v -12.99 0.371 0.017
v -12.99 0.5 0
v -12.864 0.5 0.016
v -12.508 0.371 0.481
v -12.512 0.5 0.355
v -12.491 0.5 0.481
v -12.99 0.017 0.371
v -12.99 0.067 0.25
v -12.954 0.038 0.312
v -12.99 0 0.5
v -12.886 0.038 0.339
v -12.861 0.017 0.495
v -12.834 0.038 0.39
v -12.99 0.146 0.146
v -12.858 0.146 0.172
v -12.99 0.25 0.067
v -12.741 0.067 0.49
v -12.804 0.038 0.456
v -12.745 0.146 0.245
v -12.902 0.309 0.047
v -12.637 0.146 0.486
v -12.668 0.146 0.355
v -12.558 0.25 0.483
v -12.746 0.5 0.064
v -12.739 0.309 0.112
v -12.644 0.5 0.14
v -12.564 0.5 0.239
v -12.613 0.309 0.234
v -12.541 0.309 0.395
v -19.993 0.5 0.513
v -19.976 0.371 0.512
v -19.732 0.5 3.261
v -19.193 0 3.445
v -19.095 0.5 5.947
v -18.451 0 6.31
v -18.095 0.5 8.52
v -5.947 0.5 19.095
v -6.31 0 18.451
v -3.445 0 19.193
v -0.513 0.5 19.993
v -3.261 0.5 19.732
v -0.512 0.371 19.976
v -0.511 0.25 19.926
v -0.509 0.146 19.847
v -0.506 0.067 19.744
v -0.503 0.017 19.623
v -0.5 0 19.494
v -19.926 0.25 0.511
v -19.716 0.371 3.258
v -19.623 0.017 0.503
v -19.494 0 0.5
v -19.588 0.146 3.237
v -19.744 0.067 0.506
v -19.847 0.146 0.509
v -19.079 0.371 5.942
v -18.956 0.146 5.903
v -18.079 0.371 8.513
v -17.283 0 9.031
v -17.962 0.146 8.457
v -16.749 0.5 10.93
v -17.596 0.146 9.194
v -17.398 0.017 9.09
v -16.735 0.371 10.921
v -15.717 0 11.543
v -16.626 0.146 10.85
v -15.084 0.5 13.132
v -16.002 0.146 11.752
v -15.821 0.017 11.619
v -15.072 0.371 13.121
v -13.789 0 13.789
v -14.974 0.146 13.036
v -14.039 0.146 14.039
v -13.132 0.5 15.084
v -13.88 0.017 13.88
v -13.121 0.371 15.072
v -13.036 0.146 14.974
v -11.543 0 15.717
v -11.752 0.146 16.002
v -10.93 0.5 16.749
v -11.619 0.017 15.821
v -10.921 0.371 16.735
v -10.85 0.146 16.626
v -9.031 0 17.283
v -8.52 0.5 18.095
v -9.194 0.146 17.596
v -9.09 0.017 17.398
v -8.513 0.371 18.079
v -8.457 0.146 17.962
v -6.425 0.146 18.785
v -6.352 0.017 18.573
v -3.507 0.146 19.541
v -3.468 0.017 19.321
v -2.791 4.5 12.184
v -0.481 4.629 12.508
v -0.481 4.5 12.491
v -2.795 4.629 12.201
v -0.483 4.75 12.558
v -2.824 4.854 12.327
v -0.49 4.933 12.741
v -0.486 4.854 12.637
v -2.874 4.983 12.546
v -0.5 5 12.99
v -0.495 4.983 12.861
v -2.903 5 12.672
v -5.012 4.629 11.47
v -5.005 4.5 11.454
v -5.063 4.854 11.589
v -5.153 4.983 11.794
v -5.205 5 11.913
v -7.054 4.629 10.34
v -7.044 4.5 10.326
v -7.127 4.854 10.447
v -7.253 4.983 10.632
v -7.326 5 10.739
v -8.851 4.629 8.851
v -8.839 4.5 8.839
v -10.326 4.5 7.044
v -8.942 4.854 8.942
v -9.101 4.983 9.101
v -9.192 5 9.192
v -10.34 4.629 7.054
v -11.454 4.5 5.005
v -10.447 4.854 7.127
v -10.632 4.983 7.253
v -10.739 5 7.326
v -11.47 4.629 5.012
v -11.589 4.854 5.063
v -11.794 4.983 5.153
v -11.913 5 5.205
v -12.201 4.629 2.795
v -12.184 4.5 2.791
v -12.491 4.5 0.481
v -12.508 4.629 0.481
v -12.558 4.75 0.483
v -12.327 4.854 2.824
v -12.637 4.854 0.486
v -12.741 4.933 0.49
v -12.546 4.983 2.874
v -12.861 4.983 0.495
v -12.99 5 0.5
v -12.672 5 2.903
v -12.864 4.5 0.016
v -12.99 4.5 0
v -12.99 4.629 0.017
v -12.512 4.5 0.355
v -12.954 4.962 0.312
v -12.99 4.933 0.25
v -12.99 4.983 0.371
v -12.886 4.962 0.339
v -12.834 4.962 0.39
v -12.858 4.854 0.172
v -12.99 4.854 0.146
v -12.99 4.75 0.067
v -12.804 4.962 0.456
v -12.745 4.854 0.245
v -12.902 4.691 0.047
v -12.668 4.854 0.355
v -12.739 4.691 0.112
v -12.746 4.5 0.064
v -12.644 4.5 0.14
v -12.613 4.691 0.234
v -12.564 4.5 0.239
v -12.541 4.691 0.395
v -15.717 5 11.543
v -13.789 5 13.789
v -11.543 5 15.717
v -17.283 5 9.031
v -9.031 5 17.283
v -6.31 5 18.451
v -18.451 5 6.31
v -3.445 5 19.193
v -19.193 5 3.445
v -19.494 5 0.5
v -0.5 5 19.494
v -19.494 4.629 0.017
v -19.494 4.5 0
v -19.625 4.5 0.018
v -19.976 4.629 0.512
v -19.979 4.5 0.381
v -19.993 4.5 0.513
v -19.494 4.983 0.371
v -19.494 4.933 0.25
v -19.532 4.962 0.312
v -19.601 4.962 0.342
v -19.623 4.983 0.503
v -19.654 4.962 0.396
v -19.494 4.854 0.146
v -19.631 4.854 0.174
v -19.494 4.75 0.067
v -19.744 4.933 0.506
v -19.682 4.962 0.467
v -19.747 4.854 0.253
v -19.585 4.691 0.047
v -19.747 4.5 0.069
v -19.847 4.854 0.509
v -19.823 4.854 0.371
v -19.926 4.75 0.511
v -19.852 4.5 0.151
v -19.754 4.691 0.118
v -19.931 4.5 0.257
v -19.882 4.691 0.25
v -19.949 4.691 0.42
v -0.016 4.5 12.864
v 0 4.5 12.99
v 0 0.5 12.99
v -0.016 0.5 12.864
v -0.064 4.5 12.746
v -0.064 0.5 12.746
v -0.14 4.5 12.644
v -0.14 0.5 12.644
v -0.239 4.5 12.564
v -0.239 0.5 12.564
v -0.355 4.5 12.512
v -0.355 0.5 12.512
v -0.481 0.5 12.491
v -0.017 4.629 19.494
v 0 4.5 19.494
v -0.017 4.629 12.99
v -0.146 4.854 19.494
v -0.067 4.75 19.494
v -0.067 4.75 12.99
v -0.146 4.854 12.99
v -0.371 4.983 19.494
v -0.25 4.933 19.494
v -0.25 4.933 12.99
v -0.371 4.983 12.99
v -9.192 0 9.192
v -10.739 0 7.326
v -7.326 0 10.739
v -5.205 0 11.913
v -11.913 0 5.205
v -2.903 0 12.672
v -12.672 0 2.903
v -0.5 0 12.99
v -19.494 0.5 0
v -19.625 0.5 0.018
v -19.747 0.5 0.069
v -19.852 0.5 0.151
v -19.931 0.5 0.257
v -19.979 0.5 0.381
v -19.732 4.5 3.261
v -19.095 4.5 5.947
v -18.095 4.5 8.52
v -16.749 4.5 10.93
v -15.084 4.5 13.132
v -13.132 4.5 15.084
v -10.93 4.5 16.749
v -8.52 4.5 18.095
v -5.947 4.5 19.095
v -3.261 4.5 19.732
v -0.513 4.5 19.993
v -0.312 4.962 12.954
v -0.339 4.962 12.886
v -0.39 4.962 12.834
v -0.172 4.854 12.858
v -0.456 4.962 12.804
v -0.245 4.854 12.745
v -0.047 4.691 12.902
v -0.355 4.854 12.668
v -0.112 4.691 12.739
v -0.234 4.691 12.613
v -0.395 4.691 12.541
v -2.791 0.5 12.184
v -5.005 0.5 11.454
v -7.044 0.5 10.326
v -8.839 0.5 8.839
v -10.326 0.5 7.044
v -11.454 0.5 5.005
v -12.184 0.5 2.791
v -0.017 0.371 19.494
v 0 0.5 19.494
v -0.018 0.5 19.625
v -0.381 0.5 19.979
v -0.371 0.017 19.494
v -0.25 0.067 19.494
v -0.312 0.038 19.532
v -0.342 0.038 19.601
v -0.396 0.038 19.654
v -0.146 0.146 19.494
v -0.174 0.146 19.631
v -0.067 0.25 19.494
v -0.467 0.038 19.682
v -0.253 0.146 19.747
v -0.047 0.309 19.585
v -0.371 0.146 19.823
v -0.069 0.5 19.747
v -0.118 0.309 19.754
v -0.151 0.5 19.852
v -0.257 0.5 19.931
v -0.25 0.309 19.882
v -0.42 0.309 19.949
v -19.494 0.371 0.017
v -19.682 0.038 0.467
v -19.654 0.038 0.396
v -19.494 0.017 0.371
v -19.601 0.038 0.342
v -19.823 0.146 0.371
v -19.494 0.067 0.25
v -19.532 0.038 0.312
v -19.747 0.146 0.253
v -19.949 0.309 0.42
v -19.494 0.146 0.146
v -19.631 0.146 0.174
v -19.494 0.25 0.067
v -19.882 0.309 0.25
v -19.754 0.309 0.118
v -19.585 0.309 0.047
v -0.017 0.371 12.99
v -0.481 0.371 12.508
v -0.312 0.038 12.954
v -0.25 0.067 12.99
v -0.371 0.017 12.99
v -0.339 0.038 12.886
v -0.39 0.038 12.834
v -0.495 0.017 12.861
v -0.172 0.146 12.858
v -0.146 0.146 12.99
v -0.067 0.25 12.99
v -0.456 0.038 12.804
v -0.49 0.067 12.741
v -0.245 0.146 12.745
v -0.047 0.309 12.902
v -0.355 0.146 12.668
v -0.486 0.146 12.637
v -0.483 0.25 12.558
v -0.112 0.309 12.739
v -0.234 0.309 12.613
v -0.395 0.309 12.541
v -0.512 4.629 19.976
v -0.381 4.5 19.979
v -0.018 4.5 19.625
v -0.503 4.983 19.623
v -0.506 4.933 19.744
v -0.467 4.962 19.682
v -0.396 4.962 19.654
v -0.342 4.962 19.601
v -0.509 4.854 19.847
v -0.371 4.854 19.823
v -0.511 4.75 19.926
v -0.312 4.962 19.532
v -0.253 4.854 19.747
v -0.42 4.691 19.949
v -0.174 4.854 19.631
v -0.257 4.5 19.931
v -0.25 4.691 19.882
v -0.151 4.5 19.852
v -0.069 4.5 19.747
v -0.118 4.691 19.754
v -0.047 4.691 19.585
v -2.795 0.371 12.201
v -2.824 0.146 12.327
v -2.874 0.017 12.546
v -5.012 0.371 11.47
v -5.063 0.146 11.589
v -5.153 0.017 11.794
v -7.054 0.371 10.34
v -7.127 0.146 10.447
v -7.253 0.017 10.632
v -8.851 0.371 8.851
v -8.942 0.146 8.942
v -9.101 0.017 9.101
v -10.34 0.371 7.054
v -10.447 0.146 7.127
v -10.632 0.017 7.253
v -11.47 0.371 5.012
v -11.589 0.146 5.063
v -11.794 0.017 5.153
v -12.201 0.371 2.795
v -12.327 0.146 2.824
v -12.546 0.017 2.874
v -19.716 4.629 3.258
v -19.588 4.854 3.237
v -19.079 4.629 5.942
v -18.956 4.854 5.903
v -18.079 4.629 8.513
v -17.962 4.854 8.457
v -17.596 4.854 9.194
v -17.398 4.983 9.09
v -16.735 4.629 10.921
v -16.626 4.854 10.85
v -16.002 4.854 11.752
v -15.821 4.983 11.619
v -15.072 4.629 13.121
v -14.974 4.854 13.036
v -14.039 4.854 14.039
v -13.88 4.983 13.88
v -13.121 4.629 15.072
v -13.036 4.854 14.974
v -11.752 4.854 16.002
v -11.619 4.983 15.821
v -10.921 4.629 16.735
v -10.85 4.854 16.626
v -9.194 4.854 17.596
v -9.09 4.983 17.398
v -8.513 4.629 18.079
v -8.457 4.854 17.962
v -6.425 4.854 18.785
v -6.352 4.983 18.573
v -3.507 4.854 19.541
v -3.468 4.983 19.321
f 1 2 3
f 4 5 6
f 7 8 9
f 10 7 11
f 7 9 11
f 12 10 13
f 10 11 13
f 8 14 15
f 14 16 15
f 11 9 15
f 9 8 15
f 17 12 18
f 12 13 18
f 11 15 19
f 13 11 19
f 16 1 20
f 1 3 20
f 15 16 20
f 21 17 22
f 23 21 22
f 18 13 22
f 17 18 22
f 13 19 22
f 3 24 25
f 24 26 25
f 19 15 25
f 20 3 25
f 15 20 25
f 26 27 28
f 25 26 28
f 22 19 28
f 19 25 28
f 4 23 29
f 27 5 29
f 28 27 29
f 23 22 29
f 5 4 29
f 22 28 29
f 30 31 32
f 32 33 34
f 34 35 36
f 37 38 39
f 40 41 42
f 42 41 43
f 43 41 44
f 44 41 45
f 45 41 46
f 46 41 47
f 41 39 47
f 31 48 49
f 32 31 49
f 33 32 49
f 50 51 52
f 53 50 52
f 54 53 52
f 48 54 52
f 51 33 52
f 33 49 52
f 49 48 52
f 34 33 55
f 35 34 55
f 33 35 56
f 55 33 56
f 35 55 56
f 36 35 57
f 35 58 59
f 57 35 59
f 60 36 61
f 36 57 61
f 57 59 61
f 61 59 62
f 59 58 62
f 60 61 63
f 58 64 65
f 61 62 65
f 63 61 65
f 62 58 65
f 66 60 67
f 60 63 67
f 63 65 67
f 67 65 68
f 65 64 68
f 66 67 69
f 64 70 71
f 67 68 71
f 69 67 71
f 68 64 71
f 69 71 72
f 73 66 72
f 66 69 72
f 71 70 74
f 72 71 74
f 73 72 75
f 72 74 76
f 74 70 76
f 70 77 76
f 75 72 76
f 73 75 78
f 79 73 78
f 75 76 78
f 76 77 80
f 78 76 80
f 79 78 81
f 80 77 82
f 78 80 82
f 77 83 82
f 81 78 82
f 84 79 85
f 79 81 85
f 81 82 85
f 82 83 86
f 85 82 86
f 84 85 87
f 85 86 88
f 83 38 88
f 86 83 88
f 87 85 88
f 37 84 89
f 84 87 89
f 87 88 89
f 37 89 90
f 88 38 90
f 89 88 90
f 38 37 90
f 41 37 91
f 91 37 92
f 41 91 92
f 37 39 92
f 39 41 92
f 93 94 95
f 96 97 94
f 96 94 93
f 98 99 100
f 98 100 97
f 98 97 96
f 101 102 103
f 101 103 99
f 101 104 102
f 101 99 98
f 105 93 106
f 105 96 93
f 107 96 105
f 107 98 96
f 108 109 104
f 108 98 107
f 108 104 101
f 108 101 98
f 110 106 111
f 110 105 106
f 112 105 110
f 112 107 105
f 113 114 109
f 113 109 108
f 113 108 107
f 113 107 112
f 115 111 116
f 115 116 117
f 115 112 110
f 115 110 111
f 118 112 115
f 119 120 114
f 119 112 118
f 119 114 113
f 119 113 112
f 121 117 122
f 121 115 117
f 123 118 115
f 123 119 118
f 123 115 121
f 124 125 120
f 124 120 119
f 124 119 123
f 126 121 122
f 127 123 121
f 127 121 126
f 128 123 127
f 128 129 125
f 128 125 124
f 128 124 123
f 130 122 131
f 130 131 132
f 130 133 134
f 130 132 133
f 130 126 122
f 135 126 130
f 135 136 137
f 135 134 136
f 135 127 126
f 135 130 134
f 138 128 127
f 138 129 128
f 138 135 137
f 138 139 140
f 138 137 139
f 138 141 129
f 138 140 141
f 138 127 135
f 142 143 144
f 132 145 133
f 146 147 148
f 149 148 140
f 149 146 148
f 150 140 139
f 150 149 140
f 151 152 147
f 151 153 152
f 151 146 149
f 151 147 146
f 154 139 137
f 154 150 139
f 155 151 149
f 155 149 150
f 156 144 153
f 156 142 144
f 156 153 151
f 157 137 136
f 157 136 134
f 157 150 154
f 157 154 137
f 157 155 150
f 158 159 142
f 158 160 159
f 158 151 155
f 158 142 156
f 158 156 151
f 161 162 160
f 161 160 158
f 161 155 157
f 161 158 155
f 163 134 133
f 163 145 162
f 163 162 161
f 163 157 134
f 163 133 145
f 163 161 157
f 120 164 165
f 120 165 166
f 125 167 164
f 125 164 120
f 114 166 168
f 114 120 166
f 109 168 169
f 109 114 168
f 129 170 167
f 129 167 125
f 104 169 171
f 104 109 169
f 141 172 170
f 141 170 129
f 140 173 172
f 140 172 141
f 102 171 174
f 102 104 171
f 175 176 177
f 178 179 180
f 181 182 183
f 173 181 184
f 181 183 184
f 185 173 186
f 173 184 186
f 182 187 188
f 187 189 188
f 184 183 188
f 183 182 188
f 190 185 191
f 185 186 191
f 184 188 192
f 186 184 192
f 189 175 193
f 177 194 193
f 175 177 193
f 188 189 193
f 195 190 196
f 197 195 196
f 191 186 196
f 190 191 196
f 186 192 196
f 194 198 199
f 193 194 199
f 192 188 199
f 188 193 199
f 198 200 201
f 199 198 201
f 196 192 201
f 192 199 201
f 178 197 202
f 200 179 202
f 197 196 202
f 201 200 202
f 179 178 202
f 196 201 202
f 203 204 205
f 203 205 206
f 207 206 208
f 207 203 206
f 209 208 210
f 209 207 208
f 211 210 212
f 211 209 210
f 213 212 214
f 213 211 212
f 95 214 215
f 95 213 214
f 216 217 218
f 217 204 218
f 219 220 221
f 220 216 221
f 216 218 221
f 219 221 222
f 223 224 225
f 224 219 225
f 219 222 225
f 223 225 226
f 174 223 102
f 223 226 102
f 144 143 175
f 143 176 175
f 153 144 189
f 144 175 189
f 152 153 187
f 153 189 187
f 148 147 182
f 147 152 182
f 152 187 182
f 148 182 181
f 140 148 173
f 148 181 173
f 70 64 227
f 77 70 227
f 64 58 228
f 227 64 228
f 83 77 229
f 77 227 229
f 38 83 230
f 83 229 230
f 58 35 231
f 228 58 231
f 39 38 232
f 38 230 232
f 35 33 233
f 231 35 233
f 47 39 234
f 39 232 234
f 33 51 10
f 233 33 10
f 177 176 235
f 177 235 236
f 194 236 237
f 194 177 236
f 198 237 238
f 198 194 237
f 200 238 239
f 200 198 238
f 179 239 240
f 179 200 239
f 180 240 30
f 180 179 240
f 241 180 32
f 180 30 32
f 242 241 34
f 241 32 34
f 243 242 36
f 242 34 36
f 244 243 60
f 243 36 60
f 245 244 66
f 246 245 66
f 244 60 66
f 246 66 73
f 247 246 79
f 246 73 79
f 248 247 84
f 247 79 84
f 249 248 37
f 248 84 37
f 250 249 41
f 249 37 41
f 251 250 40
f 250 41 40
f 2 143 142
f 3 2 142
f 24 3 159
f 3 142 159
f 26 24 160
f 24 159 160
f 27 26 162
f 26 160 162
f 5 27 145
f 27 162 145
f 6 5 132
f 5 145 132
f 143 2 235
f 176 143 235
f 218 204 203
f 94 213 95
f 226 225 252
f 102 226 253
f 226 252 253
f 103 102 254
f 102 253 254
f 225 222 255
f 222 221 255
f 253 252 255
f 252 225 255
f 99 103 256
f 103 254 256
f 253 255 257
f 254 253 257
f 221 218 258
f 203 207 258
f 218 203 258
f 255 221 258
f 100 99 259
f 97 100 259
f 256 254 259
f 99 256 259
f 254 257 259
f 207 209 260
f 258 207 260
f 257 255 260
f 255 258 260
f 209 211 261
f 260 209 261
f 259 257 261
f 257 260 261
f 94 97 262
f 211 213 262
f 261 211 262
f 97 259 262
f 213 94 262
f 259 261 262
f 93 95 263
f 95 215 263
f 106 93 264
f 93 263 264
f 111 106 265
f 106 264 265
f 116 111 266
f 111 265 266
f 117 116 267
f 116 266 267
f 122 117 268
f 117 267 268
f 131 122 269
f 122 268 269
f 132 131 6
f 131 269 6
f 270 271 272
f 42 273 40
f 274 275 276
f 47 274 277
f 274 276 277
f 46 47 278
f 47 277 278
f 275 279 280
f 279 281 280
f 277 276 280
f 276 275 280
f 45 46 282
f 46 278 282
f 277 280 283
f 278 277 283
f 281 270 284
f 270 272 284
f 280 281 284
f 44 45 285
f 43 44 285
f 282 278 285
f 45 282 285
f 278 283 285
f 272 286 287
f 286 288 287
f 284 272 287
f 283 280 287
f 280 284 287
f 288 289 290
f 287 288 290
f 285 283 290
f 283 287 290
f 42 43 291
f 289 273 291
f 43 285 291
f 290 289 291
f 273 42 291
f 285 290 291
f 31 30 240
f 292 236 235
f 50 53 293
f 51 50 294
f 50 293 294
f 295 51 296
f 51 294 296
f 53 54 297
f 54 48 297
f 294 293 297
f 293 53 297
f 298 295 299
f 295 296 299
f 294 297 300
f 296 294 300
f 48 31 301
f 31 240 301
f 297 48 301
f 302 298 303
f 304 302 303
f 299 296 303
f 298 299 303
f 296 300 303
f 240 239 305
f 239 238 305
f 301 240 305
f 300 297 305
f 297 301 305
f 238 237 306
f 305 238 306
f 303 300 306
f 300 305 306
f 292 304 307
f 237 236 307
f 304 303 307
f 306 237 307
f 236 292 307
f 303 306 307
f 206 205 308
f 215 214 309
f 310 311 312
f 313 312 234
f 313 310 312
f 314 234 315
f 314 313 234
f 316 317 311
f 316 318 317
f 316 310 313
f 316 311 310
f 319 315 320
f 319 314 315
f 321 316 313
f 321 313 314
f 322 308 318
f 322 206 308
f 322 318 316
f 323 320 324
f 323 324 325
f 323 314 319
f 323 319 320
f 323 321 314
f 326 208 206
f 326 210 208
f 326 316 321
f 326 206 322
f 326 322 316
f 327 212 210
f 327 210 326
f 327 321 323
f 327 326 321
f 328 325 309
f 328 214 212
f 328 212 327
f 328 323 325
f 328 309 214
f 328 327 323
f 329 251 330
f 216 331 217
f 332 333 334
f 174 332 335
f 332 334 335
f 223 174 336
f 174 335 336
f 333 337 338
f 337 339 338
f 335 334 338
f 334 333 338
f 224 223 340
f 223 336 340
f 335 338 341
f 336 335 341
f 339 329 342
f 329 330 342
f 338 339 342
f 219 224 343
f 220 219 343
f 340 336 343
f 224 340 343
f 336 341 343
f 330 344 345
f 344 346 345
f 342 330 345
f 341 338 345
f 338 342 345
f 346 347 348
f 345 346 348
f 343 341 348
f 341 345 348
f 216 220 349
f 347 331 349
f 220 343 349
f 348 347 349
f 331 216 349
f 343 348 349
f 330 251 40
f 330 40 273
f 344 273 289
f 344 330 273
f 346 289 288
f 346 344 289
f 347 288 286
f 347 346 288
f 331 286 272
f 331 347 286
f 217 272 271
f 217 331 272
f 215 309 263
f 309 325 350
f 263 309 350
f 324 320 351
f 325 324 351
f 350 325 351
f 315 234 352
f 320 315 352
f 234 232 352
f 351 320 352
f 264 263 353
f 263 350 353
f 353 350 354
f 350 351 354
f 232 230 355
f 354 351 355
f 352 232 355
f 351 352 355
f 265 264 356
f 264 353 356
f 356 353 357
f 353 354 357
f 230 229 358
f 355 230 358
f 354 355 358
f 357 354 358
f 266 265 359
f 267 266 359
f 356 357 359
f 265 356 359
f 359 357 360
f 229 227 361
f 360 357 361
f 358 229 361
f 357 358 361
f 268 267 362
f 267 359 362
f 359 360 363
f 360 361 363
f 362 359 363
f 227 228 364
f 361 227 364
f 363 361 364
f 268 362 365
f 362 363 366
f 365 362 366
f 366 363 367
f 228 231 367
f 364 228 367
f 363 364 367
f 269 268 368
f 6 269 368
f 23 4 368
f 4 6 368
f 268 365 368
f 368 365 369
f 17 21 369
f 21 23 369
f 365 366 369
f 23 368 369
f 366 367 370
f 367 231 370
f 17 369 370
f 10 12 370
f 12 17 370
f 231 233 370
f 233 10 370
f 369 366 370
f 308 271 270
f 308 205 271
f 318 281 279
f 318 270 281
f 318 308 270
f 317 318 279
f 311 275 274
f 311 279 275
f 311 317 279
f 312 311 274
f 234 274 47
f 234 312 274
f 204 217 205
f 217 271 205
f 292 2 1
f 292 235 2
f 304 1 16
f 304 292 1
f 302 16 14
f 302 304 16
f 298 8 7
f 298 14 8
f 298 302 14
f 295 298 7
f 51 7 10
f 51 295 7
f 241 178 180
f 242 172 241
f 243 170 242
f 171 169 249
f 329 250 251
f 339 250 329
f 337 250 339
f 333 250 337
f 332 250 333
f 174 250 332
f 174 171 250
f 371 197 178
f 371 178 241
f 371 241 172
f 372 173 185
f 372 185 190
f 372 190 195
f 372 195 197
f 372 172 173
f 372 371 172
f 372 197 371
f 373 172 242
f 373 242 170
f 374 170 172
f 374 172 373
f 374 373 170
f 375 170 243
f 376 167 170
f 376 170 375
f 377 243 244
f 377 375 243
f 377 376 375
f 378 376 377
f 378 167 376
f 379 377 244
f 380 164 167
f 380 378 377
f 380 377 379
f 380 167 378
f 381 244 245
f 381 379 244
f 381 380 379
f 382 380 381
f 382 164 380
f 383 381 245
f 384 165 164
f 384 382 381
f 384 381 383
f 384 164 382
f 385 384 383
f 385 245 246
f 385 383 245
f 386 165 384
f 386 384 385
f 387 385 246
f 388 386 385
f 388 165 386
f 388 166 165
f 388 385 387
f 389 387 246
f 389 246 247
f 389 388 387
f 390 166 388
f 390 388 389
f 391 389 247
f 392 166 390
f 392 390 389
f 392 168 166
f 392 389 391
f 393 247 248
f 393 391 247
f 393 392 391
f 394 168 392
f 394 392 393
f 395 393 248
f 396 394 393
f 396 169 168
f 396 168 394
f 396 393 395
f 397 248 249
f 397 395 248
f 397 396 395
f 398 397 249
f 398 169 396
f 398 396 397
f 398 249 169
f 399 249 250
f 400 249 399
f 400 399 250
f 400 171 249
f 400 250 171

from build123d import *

# Parameters (mm, degrees)
BOSS_EXTRUDE1_DEPTH = 5
FILLET1_R           = 0.5


with BuildPart() as part:
    # Sketch1 → Boss-Extrude1 (new body)
    with BuildSketch(Plane(origin=(0, 0, 0), x_dir=(1, 0, 0), z_dir=(0, 1, 0))):
        with BuildLine():
            Line((-12.5, 0), (-20, 0))
            ThreePointArc((-20, 0), (-14.142135624, -14.142135624), (0, -20))
            Line((0, -20), (0, -12.5))
            ThreePointArc((0, -12.5), (-8.838834765, -8.838834765), (-12.5, 0))
        make_face()
    extrude(amount=BOSS_EXTRUDE1_DEPTH)

    # Fillet1
    fillet1_edges = [part.edges().sort_by_distance(p)[0] for p in [
        (-14.142135624, 5, 14.142135624),
        (0, 5, 16.25),
        (-8.838834765, 5, 8.838834765),
        (0, 0, 16.25),
        (-14.142135624, 0, 14.142135624),
        (-16.25, 0, 0),
        (-8.838834765, 0, 8.838834765),
        (0, 2.5, 12.5),
        (0, 2.5, 20),
        (-20, 2.5, 0),
        (-12.5, 2.5, 0),
        (-16.25, 5, 0),
    ]]
    fillet(fillet1_edges, radius=FILLET1_R)


solid = part.part
